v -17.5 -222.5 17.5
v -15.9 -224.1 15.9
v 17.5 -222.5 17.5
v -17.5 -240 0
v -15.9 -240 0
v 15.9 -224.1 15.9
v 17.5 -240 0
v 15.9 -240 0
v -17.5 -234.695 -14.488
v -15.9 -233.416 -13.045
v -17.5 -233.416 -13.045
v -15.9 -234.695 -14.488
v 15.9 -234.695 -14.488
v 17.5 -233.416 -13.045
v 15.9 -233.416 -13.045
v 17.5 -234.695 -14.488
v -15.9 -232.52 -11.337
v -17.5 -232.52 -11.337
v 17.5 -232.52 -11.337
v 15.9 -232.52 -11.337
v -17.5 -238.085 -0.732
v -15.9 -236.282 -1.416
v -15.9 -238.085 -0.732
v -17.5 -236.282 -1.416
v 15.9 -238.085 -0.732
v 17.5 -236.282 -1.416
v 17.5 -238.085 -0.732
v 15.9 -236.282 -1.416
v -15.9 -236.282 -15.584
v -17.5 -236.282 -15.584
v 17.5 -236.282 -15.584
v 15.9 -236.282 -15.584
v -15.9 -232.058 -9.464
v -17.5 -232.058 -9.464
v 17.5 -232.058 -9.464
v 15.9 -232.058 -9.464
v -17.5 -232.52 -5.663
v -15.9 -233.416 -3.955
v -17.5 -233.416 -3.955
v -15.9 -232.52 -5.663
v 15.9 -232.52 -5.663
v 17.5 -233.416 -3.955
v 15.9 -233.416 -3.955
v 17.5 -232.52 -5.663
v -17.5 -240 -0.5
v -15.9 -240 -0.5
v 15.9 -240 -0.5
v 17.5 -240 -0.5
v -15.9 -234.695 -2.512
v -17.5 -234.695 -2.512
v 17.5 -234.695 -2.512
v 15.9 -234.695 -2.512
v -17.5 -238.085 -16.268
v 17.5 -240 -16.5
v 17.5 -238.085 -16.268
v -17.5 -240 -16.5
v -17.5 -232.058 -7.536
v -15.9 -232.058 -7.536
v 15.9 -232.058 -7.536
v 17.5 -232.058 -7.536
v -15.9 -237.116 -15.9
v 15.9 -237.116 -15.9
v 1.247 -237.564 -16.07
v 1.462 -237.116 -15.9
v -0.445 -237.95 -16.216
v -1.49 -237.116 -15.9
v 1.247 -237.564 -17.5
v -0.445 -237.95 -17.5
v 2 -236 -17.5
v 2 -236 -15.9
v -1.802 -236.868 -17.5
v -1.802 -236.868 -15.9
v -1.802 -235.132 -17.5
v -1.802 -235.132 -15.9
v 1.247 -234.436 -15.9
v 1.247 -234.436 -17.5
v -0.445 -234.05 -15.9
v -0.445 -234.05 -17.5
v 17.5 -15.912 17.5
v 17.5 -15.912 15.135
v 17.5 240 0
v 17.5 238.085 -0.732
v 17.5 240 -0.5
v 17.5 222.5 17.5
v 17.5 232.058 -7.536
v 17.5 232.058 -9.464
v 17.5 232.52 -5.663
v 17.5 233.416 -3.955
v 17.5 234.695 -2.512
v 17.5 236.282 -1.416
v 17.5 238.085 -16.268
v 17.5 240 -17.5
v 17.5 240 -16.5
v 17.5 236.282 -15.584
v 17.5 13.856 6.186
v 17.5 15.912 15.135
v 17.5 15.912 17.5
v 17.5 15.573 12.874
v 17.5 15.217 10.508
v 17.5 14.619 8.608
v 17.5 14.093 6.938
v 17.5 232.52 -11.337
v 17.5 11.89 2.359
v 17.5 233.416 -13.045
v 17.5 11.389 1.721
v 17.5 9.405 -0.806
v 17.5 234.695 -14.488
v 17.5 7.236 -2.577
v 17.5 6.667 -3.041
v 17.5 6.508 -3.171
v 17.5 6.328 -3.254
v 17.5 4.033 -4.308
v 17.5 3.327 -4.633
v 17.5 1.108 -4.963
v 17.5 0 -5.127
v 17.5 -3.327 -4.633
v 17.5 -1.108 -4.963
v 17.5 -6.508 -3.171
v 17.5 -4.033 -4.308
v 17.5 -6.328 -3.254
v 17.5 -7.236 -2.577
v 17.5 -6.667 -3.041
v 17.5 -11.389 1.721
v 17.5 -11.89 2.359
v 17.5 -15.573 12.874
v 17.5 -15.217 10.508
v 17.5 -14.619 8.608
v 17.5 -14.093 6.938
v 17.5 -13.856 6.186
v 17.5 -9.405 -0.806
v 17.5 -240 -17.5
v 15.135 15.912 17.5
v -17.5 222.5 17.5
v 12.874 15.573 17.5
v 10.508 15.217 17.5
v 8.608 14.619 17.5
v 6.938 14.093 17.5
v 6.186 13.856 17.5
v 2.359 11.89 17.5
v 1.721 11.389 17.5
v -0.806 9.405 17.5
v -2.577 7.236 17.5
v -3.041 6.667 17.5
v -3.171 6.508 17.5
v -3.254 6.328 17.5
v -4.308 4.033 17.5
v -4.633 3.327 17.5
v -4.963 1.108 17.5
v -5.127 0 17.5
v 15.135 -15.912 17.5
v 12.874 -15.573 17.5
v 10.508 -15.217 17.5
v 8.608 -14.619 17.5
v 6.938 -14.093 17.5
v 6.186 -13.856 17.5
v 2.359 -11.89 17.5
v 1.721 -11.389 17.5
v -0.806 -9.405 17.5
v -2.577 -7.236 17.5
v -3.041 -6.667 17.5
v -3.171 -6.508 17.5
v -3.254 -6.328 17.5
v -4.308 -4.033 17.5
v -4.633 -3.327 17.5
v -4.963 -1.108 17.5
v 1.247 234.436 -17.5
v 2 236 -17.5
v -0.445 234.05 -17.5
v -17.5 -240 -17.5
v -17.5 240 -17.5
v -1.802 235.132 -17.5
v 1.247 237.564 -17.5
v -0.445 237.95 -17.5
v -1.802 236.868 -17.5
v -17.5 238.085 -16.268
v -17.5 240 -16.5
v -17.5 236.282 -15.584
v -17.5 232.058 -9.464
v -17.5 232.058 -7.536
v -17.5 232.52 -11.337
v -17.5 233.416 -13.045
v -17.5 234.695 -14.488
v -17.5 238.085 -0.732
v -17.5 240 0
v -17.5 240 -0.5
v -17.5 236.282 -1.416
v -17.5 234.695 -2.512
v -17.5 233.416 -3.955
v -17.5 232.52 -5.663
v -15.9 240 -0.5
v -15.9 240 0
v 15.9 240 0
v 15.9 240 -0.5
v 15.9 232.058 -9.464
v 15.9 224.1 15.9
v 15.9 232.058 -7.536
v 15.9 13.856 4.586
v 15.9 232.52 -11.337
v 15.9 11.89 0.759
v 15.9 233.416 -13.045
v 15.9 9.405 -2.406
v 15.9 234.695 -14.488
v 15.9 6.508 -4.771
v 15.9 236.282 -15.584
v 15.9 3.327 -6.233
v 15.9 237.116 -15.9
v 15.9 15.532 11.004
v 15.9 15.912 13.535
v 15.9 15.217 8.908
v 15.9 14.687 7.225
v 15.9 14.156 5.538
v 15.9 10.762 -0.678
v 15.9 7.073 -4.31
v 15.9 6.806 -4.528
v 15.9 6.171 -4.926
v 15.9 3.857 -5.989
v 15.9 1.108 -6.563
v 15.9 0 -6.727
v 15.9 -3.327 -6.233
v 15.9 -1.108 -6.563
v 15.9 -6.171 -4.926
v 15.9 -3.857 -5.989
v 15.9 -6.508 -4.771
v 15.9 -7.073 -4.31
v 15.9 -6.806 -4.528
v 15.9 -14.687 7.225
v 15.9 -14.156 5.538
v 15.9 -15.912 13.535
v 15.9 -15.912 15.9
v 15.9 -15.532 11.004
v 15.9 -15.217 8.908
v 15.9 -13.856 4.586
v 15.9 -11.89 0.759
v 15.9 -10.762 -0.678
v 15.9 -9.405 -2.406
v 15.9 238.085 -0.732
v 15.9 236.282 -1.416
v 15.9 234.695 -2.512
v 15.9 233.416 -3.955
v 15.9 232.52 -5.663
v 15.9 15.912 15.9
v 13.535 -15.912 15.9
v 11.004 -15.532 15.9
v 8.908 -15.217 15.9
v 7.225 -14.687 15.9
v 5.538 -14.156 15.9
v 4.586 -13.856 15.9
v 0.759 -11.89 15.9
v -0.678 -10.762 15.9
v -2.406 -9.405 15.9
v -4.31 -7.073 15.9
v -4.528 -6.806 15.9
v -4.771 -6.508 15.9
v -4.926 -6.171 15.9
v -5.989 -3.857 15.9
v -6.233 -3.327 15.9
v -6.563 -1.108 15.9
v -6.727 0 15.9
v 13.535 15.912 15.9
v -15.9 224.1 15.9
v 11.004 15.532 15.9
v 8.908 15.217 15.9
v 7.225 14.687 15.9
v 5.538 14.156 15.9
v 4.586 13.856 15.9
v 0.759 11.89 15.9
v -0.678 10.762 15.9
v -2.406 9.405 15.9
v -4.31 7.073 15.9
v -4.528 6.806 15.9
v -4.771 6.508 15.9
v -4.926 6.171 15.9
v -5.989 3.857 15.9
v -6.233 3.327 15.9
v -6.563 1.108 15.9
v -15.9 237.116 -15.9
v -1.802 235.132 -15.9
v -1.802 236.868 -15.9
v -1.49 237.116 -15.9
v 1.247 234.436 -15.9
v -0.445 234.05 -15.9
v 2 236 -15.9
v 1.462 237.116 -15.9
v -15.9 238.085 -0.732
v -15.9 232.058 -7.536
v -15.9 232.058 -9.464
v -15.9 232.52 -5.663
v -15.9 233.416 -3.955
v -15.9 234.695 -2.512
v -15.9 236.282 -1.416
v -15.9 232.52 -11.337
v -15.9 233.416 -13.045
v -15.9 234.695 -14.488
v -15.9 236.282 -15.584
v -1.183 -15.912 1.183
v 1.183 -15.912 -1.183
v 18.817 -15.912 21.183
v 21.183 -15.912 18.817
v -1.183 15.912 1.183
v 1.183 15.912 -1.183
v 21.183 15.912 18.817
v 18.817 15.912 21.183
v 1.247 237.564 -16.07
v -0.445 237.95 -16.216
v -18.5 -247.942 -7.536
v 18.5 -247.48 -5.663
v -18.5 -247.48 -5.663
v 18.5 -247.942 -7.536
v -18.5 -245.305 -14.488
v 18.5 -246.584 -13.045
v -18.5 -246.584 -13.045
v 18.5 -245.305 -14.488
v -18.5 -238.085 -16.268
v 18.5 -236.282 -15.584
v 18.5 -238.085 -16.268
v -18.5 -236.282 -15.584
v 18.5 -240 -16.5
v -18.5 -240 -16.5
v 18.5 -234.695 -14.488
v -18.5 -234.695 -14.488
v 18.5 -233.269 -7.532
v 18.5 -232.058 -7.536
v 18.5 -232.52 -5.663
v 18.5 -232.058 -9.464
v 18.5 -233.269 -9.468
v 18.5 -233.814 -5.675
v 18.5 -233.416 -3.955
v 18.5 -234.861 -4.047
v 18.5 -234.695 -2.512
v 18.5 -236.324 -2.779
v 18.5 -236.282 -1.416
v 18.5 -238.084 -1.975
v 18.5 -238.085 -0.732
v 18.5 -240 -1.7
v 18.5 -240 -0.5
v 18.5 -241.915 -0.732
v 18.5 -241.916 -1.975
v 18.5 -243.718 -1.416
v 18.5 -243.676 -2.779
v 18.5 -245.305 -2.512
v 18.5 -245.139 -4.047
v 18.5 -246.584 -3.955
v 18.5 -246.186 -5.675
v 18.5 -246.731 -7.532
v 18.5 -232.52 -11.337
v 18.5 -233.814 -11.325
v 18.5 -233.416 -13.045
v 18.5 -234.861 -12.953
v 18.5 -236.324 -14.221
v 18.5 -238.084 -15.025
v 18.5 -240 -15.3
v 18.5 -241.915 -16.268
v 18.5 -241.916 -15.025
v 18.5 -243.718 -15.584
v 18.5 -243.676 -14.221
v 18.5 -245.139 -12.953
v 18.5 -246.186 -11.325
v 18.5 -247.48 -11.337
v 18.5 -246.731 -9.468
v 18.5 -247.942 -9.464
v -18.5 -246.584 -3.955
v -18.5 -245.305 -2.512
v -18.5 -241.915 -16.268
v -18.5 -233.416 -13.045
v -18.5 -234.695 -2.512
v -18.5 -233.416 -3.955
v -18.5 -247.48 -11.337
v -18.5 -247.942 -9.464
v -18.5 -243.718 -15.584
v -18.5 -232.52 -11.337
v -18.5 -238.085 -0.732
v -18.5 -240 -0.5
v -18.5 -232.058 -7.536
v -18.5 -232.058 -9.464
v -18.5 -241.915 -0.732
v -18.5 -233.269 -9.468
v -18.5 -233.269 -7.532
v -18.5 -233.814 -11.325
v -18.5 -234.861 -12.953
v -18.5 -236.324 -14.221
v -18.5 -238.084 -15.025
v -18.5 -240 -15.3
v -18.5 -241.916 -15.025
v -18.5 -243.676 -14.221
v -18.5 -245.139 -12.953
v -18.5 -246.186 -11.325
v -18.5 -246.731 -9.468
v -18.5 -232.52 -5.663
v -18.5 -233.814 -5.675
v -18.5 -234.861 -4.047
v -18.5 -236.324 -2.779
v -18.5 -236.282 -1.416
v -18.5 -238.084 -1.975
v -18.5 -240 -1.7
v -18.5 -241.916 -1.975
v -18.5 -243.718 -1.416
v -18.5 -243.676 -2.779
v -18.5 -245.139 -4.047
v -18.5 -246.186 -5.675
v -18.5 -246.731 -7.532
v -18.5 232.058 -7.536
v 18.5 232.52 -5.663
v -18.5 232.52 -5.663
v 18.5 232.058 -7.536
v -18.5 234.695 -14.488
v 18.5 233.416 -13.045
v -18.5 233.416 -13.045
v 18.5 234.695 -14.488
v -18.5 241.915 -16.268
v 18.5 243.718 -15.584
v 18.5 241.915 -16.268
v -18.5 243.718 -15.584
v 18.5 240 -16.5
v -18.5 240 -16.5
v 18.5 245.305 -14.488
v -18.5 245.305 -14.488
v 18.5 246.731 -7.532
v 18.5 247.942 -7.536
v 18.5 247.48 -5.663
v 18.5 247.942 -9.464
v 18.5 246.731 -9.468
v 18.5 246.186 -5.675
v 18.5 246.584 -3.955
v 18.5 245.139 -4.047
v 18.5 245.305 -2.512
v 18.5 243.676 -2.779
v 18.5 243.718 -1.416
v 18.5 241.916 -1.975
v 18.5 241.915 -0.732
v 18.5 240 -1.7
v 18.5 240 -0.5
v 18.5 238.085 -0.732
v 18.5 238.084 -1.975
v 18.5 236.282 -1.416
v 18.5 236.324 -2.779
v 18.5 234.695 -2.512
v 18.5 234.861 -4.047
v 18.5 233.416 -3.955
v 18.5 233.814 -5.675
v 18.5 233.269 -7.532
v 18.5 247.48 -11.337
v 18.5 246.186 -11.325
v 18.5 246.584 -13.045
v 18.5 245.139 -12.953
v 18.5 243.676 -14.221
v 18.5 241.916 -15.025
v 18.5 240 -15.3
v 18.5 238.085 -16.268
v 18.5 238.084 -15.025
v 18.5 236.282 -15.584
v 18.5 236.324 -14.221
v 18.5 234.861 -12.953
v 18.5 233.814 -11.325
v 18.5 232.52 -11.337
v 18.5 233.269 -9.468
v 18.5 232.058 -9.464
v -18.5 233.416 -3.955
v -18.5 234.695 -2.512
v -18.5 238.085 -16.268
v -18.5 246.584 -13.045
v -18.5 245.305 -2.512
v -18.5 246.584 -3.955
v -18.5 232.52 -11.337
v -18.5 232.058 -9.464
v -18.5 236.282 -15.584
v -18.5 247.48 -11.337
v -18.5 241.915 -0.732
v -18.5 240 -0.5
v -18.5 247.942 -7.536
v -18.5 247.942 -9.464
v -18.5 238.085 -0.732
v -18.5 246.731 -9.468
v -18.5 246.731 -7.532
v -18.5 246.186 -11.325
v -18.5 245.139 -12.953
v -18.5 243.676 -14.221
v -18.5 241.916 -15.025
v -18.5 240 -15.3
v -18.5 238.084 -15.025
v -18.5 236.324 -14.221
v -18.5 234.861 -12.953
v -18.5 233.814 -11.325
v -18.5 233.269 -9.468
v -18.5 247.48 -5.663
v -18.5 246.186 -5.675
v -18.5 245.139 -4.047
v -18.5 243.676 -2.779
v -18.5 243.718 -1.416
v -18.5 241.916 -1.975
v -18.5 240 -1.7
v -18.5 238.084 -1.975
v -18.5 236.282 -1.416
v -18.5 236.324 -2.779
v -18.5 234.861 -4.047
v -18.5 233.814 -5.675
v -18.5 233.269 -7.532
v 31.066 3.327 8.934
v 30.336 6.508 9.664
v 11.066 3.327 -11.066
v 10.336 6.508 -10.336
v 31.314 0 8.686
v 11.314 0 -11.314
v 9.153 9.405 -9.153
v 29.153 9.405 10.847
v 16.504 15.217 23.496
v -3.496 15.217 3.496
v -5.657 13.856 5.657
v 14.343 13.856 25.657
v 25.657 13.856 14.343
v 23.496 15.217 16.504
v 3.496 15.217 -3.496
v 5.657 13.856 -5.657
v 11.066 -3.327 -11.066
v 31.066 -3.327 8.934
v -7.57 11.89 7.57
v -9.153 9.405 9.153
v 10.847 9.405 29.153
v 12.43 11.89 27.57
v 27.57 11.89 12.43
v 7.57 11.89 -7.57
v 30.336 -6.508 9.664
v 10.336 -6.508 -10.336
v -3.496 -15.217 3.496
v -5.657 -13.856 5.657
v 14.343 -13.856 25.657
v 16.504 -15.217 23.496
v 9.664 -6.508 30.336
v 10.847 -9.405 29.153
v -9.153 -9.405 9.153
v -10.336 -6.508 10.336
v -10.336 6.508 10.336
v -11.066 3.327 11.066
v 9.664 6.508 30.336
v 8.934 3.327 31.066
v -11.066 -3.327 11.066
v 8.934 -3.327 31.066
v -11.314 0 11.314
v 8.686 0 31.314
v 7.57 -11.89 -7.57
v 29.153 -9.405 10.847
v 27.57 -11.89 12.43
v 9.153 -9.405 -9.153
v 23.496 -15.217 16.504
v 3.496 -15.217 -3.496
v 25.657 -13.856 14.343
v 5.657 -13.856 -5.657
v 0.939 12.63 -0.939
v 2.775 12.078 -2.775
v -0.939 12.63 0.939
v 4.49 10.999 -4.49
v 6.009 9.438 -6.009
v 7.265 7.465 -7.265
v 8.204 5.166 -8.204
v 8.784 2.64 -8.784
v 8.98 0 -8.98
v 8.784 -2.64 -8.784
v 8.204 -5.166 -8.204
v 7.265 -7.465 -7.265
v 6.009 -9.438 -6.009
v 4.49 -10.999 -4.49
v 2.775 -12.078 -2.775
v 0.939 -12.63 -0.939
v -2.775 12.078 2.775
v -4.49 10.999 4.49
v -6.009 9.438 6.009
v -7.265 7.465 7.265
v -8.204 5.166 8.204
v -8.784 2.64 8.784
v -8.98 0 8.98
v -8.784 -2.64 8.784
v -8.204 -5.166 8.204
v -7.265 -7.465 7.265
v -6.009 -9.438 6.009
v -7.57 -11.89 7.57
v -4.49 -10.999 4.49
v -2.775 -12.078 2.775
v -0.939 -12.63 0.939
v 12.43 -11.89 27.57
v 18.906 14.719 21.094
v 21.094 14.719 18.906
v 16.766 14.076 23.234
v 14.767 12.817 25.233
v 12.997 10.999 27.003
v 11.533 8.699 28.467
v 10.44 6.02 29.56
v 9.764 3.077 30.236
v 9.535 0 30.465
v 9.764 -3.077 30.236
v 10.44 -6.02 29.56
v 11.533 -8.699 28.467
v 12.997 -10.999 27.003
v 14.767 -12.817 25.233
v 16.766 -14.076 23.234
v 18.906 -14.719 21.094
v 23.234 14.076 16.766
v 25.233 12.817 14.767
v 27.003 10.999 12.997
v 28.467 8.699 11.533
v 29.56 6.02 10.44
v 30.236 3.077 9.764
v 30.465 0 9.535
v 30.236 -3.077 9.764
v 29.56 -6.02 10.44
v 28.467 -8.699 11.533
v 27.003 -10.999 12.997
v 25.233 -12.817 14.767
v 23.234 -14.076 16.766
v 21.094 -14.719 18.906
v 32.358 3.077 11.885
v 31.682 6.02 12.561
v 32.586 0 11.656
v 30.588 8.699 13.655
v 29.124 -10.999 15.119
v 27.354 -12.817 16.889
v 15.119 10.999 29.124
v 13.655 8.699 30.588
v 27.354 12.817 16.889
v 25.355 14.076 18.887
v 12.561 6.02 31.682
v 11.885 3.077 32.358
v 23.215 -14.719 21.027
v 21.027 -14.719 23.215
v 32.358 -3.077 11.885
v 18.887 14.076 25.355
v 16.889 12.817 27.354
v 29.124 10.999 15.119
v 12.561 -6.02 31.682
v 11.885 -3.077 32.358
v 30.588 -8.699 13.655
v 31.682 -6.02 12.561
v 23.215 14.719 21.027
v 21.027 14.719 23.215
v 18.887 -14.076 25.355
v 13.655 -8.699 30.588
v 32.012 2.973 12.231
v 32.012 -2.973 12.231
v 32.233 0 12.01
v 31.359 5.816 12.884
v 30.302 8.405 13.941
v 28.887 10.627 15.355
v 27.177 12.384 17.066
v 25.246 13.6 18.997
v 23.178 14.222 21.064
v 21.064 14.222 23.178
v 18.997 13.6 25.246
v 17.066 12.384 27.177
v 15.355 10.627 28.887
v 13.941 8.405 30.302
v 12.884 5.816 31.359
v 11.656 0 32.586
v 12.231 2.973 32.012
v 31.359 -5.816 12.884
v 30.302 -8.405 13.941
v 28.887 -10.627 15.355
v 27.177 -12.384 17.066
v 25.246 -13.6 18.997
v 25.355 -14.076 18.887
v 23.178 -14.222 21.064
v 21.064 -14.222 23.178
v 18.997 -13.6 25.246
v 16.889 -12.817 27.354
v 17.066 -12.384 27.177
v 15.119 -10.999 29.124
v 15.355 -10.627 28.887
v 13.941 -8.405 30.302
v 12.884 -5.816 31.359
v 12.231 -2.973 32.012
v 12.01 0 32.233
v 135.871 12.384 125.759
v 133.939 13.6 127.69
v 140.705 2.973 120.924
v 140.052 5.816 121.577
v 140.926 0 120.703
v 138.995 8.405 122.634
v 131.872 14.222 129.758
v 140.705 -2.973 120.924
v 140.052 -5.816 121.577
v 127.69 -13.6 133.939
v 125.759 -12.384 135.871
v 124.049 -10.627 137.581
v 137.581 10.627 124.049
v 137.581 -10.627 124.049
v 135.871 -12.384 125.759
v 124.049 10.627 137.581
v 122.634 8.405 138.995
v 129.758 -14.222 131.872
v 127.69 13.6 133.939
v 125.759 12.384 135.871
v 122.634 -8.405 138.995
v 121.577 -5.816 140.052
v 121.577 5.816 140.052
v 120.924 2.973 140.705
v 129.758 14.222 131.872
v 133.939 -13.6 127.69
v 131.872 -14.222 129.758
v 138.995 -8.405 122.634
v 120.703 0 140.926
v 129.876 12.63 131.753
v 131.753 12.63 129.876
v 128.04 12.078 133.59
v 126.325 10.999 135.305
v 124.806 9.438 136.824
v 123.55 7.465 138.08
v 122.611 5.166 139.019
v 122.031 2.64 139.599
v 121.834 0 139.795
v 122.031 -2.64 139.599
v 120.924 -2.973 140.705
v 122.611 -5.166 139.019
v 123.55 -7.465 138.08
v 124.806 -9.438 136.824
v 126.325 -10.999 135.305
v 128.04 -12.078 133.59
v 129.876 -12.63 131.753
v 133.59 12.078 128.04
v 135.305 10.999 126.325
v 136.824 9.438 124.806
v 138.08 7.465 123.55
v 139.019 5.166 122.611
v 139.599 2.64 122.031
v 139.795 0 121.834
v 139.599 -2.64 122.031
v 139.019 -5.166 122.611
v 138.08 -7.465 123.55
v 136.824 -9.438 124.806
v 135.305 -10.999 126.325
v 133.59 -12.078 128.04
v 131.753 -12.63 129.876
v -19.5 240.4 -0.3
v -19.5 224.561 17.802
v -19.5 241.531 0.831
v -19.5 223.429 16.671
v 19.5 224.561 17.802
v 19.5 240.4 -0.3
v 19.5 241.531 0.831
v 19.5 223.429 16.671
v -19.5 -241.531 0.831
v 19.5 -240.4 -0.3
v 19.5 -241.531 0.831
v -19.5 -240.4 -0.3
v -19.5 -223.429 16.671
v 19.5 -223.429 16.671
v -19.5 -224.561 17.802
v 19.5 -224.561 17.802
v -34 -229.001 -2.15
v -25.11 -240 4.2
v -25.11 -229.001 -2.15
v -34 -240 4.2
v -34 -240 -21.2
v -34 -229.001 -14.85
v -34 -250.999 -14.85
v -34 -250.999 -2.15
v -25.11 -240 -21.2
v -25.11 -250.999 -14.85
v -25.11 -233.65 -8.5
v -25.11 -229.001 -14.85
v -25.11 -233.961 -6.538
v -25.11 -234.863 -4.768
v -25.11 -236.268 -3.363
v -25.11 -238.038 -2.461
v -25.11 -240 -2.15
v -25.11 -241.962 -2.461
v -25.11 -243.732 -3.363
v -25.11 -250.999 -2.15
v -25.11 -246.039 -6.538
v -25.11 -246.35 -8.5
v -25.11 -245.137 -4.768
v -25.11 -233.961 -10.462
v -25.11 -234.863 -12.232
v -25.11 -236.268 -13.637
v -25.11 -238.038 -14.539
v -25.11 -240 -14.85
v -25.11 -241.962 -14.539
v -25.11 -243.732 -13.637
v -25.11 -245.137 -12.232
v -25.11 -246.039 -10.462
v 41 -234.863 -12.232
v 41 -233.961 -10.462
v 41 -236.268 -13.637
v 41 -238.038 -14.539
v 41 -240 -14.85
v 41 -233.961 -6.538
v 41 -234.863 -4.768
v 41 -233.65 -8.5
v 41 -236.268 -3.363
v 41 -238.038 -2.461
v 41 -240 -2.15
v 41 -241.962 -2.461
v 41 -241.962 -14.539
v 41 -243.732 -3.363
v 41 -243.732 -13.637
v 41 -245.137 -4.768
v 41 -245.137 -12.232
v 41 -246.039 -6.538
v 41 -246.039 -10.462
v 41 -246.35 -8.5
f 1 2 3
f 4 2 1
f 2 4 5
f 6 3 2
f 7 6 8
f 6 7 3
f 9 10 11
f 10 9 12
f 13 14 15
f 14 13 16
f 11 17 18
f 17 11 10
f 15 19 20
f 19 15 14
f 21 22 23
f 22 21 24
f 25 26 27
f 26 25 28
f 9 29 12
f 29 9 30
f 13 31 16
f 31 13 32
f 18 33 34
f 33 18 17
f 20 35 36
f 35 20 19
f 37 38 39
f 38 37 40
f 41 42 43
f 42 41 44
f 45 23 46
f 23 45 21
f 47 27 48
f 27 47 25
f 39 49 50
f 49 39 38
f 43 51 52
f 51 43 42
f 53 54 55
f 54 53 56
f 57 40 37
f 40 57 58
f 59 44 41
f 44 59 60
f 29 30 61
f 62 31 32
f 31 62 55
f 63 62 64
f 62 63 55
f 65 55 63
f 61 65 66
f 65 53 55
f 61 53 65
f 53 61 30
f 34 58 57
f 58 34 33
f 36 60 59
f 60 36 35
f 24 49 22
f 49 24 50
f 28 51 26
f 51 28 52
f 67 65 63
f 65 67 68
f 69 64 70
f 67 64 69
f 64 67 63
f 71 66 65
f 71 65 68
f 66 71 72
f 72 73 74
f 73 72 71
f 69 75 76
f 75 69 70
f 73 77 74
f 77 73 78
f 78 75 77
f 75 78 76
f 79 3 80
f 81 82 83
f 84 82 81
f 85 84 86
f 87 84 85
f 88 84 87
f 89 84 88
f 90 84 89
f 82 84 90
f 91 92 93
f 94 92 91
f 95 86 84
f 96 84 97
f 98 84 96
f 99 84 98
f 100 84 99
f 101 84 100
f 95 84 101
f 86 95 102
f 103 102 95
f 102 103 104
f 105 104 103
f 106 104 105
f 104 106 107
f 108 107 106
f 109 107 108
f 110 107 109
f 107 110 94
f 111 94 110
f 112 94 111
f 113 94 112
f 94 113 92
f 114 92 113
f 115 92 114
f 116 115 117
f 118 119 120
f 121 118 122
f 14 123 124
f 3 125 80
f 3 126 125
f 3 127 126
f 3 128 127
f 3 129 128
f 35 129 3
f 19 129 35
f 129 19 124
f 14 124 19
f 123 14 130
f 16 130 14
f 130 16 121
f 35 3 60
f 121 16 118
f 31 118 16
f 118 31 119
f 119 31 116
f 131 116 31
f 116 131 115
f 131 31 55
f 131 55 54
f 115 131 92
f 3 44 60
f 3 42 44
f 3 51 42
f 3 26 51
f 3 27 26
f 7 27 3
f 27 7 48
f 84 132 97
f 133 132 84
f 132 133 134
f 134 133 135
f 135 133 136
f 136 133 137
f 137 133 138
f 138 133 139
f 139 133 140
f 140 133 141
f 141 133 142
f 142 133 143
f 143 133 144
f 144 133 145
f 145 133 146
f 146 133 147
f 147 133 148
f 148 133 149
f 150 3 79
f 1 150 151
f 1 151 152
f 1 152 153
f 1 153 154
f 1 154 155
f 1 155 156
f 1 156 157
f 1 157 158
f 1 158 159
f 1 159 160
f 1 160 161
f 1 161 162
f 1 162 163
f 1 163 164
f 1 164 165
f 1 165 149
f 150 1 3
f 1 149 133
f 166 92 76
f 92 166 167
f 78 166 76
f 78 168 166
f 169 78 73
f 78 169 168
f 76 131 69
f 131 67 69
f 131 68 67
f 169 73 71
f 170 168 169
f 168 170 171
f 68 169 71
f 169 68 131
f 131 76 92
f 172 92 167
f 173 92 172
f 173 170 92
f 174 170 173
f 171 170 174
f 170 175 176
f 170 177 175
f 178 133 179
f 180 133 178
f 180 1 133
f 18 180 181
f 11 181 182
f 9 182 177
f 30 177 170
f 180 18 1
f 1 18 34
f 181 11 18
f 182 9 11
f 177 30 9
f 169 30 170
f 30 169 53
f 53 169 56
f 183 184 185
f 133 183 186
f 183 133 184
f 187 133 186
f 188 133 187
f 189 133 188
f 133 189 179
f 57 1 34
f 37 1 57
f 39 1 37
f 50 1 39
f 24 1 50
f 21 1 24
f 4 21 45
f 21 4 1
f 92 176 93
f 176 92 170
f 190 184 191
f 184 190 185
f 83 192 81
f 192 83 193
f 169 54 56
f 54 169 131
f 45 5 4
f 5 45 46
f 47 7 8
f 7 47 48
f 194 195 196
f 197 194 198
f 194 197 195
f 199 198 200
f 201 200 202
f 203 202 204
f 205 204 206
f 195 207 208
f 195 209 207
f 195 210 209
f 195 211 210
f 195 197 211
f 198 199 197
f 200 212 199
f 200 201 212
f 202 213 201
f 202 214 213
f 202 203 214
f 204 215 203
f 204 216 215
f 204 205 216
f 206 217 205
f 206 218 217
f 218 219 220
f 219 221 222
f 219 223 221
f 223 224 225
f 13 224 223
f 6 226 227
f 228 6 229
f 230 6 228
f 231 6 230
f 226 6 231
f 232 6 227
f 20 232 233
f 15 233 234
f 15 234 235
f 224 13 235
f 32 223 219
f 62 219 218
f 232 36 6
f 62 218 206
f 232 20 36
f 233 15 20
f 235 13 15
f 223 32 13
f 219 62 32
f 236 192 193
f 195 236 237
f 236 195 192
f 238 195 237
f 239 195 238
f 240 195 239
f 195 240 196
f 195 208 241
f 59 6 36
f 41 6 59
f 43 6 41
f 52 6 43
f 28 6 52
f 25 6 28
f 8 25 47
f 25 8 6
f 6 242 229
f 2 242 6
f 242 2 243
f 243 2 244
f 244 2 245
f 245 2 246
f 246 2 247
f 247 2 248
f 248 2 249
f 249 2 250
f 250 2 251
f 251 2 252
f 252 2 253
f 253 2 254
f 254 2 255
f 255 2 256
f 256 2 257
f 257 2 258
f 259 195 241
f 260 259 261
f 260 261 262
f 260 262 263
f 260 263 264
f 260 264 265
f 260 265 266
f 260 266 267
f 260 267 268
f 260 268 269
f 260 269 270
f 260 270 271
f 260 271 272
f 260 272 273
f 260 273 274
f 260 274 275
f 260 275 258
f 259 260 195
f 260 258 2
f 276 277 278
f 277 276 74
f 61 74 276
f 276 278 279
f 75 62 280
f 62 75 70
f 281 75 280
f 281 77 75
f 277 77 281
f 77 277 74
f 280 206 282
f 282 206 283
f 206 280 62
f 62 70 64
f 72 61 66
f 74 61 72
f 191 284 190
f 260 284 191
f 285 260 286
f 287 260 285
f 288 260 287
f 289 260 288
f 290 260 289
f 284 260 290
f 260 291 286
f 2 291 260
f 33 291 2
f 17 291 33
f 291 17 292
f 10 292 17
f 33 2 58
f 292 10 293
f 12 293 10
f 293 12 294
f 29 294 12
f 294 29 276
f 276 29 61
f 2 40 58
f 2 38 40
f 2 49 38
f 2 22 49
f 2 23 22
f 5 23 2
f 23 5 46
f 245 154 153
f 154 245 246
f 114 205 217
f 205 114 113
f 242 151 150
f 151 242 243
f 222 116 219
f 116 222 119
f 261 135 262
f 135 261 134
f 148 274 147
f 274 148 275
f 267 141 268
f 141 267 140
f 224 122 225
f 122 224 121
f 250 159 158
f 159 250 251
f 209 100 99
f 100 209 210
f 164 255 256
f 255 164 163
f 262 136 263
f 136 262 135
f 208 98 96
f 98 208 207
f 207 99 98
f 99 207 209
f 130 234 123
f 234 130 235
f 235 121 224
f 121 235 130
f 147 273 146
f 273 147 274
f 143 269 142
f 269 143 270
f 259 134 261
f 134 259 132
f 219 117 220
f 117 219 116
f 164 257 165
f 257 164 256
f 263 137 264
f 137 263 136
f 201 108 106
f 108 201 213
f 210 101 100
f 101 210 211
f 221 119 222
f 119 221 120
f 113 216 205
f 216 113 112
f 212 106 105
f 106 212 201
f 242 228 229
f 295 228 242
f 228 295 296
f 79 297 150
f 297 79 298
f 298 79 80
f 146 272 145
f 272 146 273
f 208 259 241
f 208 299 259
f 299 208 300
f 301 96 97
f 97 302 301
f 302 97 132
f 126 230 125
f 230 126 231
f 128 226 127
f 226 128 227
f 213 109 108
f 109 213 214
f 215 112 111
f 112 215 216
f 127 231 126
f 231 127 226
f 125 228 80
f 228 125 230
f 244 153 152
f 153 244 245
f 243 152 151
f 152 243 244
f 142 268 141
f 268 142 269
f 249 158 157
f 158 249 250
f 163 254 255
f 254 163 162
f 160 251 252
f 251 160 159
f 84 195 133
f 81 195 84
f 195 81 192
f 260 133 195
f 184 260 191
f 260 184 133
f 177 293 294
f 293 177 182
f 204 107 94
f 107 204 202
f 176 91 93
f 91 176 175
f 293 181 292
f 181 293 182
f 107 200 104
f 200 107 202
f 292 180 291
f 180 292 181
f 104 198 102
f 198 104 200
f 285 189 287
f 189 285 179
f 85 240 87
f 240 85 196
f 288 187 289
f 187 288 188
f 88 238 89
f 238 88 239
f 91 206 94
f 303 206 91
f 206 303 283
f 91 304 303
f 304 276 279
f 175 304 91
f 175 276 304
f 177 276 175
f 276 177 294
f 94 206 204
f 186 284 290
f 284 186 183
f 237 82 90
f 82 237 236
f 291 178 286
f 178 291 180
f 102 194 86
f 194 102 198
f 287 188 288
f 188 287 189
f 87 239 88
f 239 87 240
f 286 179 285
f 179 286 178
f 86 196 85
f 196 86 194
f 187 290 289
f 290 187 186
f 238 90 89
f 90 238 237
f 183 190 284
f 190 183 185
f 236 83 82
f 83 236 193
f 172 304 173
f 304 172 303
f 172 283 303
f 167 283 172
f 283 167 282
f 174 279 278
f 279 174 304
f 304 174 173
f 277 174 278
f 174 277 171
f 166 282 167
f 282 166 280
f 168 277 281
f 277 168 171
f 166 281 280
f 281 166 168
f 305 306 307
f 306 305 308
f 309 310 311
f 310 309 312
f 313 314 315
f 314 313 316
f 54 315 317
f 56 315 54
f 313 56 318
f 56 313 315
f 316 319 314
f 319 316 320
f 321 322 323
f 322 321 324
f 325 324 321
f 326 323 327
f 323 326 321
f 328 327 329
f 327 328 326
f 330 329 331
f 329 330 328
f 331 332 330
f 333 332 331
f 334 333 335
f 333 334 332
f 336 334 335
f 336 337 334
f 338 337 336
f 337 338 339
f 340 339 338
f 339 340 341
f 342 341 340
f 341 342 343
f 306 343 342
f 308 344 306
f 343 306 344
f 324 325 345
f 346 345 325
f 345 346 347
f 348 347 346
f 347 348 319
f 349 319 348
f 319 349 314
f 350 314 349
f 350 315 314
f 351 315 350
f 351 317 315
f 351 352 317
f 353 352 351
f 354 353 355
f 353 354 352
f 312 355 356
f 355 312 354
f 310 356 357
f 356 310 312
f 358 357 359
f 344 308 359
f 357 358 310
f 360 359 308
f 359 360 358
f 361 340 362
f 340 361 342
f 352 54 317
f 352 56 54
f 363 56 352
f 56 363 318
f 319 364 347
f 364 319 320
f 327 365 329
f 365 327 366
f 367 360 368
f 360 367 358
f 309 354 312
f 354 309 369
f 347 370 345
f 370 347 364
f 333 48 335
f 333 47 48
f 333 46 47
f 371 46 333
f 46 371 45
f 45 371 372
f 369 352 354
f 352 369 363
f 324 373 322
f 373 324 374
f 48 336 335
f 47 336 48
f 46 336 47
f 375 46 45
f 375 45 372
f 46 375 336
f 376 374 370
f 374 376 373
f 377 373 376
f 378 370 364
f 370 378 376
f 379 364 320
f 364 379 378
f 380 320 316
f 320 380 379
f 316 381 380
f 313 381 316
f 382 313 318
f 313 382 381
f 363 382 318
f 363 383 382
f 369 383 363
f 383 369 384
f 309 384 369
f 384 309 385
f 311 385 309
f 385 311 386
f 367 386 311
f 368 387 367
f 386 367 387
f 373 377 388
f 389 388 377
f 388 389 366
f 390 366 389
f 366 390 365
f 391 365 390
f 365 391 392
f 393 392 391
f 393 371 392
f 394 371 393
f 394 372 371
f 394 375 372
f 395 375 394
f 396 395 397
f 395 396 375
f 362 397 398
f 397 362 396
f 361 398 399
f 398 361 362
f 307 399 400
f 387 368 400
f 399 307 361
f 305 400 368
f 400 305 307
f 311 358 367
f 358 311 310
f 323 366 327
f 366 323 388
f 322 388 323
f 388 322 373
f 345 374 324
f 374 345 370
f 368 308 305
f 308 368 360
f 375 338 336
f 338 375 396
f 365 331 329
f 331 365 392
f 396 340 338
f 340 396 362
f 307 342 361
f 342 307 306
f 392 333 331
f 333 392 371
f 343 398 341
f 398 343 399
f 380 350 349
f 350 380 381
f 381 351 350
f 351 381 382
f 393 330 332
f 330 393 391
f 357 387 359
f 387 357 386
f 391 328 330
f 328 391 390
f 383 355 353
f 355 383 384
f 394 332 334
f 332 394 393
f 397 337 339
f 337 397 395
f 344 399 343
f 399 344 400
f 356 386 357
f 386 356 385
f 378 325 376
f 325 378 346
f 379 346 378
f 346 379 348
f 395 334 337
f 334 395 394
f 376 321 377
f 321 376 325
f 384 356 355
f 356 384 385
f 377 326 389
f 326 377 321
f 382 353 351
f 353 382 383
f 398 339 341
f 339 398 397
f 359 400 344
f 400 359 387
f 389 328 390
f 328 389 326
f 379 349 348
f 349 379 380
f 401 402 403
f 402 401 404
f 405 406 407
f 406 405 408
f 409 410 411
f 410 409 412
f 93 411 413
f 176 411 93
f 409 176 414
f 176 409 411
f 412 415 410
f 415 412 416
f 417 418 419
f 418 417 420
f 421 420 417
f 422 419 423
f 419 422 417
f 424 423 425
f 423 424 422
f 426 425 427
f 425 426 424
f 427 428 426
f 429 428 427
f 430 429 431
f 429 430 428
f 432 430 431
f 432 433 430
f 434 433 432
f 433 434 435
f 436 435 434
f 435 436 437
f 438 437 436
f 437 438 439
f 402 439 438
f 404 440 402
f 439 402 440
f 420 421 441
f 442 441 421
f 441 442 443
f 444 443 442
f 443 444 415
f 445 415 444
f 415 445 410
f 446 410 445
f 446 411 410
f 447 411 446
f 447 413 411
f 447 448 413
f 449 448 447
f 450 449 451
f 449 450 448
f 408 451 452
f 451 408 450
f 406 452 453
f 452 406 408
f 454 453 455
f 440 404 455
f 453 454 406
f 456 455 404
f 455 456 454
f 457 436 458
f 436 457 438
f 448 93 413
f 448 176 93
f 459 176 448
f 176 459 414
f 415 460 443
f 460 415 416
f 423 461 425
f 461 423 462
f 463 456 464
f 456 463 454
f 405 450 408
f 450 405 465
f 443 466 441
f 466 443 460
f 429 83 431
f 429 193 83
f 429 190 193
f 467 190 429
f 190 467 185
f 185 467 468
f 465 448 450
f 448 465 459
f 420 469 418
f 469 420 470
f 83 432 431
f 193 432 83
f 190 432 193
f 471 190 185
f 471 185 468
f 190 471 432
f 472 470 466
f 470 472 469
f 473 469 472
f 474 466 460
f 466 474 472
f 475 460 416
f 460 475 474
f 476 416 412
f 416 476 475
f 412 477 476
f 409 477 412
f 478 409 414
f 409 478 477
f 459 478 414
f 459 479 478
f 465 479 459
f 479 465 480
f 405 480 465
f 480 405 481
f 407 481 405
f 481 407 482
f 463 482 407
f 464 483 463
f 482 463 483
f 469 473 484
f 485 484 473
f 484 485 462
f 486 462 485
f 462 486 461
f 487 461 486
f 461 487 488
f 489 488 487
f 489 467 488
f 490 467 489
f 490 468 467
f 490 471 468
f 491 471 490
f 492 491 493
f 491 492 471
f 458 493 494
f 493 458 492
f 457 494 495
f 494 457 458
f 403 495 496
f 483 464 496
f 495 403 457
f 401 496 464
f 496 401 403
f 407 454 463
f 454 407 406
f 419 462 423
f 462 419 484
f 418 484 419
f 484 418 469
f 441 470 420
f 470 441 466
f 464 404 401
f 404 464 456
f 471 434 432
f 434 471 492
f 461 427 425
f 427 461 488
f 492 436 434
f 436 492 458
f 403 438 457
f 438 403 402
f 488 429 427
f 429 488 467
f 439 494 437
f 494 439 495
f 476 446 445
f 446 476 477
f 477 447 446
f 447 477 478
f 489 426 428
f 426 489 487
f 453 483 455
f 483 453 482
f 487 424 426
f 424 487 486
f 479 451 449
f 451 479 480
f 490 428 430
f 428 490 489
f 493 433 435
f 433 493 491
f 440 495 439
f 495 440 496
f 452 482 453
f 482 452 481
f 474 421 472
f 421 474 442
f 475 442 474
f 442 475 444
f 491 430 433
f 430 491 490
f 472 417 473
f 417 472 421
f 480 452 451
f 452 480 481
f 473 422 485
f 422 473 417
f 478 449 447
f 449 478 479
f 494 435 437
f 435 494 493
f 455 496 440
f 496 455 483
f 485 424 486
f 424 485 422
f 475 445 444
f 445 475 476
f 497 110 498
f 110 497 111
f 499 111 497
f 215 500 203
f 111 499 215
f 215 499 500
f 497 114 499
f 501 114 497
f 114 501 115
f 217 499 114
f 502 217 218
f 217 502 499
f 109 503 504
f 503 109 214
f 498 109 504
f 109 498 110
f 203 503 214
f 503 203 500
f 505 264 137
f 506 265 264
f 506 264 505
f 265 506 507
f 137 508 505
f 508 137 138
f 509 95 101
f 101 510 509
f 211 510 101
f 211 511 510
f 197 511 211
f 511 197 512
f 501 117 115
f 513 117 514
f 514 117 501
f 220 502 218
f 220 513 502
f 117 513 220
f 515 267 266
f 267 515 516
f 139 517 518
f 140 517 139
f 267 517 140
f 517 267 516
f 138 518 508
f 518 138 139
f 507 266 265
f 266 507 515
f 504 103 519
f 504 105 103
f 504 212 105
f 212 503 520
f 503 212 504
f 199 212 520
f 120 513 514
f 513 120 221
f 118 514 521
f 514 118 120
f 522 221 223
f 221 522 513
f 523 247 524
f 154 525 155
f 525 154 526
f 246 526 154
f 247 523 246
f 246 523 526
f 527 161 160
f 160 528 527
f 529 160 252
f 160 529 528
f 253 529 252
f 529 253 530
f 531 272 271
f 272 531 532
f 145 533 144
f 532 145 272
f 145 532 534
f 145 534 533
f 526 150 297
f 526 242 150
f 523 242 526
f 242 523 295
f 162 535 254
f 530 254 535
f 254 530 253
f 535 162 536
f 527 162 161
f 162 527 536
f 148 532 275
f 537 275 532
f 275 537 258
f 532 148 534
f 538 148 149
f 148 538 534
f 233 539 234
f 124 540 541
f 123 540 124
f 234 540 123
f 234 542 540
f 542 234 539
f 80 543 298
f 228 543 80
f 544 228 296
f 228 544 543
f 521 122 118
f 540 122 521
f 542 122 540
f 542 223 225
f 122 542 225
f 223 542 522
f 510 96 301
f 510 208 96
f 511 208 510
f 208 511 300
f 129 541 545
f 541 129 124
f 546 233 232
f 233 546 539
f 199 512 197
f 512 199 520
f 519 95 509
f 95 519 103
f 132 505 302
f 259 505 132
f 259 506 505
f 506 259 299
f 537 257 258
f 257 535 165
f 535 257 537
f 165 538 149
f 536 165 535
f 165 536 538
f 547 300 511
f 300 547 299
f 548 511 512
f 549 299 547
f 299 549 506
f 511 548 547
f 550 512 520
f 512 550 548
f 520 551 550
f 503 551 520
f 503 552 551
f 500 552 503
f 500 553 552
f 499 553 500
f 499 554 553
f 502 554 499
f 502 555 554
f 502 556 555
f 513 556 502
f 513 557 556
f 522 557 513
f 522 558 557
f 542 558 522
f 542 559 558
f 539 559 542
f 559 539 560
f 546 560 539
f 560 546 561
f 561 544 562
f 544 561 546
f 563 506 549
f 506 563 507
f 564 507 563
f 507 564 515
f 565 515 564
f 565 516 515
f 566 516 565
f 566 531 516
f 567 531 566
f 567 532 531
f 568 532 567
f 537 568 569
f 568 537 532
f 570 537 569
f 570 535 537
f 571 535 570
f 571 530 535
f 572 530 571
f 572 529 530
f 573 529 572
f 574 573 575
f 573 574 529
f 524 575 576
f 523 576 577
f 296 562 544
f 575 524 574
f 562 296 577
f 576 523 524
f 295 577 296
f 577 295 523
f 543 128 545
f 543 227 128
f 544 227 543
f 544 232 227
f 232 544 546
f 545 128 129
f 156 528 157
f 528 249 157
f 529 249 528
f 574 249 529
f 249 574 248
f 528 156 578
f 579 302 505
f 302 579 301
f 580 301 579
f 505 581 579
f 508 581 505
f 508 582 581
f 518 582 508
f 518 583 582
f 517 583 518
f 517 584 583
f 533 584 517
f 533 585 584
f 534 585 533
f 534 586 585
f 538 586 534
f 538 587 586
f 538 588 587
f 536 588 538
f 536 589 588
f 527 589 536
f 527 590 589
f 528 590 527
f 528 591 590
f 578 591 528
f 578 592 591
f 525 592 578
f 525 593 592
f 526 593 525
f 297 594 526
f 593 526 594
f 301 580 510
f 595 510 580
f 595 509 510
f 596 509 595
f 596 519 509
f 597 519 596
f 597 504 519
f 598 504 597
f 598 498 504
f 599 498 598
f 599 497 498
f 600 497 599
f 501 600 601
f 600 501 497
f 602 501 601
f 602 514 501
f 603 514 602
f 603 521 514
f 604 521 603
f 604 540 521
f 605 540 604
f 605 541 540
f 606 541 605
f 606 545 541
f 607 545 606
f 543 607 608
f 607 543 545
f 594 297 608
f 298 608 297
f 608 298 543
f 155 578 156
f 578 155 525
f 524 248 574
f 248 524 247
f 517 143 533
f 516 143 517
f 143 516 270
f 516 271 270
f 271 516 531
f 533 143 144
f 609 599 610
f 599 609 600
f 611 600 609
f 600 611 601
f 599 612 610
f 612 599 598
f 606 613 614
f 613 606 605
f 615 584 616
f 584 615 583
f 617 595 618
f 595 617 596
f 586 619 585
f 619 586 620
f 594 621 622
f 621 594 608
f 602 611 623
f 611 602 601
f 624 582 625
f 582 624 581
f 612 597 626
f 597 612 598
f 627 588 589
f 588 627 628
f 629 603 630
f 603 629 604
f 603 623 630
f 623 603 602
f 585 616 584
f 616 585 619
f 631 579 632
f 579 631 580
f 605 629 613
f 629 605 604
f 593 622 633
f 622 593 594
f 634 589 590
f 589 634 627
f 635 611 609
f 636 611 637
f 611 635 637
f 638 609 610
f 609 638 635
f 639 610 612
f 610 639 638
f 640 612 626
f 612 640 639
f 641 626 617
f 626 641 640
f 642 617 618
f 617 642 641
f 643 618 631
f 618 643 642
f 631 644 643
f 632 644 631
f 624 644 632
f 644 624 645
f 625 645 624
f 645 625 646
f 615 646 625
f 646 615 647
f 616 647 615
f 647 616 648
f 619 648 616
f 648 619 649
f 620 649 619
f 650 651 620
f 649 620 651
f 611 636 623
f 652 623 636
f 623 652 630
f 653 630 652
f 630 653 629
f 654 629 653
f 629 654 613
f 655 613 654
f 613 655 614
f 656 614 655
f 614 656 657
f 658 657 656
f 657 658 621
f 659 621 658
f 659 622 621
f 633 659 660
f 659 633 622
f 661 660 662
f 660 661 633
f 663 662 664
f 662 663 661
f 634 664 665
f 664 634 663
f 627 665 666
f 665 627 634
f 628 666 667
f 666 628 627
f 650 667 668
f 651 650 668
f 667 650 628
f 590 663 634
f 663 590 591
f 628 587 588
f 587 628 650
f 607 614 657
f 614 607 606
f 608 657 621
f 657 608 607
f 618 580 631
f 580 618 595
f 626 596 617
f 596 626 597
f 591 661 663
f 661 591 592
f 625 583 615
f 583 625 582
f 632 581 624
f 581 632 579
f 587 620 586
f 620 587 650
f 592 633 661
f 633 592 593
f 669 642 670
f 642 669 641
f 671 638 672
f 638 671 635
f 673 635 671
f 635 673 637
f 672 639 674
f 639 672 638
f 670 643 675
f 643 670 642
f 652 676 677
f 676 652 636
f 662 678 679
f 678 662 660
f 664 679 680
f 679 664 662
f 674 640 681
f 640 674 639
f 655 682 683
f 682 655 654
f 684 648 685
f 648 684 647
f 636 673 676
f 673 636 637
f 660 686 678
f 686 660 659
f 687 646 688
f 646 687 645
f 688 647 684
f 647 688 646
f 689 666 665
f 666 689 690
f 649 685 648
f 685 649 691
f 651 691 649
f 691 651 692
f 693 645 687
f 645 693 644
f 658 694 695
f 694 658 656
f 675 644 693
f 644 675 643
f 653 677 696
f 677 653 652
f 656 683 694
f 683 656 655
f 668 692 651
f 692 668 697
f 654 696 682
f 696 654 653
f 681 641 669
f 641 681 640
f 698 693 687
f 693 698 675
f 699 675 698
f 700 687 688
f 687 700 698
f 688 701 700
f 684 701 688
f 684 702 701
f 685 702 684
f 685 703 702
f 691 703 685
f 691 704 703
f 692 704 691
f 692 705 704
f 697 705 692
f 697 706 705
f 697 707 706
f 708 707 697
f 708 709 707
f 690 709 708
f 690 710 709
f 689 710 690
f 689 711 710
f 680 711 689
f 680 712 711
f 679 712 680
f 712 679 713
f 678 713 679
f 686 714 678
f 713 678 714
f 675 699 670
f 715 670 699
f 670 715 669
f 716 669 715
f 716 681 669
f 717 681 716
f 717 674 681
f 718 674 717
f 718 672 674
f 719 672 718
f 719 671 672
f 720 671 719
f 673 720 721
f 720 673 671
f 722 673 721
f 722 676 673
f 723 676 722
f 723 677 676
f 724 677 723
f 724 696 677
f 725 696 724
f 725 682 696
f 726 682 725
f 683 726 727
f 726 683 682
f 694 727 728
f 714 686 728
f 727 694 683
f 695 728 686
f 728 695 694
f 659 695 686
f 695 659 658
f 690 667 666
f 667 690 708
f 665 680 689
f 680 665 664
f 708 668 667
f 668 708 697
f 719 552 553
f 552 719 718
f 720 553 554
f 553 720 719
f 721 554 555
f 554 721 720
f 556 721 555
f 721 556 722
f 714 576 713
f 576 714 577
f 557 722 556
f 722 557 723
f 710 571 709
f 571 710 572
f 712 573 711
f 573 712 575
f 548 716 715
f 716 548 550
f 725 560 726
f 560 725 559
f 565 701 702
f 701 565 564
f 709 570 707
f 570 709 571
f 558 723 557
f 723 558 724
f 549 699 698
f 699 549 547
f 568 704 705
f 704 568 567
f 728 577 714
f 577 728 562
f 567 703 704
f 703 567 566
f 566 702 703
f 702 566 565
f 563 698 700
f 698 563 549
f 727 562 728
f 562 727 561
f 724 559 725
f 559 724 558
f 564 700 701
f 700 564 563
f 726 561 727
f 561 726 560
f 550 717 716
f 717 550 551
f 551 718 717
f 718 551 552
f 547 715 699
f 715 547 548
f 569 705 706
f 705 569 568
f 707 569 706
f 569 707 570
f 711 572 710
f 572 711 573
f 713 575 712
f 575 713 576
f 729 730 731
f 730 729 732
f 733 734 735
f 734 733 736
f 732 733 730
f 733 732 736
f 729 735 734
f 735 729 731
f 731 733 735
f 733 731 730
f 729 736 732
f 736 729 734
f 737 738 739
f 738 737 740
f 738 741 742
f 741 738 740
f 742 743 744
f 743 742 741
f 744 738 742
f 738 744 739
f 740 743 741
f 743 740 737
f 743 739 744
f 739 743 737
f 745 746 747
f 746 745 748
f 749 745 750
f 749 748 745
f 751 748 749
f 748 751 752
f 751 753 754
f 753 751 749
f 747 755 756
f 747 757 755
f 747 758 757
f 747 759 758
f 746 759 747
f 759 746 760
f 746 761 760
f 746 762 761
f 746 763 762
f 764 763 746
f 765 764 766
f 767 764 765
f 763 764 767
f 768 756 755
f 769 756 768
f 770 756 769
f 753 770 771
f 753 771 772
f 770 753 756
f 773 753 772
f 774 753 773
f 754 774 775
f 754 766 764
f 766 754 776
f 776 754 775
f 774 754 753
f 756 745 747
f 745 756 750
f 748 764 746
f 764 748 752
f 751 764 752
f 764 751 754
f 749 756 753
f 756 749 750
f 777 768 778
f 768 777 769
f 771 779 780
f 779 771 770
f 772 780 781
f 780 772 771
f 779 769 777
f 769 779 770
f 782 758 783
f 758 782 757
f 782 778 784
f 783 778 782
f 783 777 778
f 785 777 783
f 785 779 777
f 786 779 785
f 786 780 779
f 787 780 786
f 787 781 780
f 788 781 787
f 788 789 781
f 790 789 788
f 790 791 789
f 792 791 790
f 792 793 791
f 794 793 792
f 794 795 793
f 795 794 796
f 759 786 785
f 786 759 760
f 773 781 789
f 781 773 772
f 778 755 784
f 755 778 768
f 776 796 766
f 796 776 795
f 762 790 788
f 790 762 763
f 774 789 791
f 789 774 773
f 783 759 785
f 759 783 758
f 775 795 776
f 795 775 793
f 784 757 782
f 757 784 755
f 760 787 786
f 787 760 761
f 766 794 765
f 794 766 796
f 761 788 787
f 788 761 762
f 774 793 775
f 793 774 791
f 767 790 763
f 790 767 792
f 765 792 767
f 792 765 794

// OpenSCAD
// file: hexagonalprism.scad
hex_prism(6.2,6);



module hex_prism(r,h){
    linear_extrude(height=h){
        hex(r);
    }
}

module hex(r){
    polygon(points = [[r,0],[r/2,r*sqrt(3)/2],
                [-r/2,r*sqrt(3)/2],[-r,0],
                [-r/2,-r*sqrt(3)/2],[r/2,-r*sqrt(3)/2]]);
}
// file: bolts.scad
use <hexagonalprism.scad>

bolt();

translate([30,0,0]) nut();

module kingpin(){
    bolt(d=12.7,l=75);
}

module bolt(d=12.7,l=62){
    rad = d/2;
    len = l;
    color("gray") hex_prism(2*rad,rad*1.4);
    color("silver") cylinder(r=rad,h=len);
}

module nut(d=12.7){
    rad = d/2;
    color("gray") difference(){
        hex_prism(2*rad,rad*1.4);
        color("silver") cylinder(r=rad,rad*1.4+2);
    }
}
// main file
use <./bolts.scad>

crossMember();
translate([-34,-240,-8.5]) rotate([0,90,0]) kingpin();

module crossMember() color("lightblue"){
    xMemShell();
    translate([0,-240,-8.5]) kingBush();
    translate([0,240,-8.5]) kingBush();
    translate([-19.5,240.4,-0.3]) endcover();
    translate([-19.5,-240.4,-0.3]) mirror([0,1,0]) endcover();
    steerer();
}

module steerer() rotate([0,45,0]) difference(){
    union(){
        cylinder(r=16,h=20*sqrt(2));
        cylinder(r=14.8,h=20*sqrt(2)+3);
        cylinder(r=14.3,h=185);
    }
    translate([0,0,-1]) cylinder(r=12.7,h=187);
}

module endcover() rotate([45,0,0,]) cube([39,1.6,24]);

module kingBush(){
    translate([-18.5,0,0]) rotate([0,90,0]) difference(){
        cylinder(r=8,h=37);
        translate([0,0,-1]) cylinder(r=6.8,h=39);
    }
}

module xMemShell() difference(){
    cube([35,480,35],center=true);
    cube([31.8,482,31.8],center=true);
    rotate([0,45,0]) cylinder(r=16,h=42);
    translate([-21,240,0]) rotate([45,0,0]) cube(42);
    translate([-21,240,-8.5]) rotate([0,90,0]) cylinder(r=8,h=42);
    translate([0,236,-18.5]) cylinder(r=2,h=4);
    mirror([0,1,0]){
        translate([-21,240,0]) rotate([45,0,0]) cube(42);
        translate([-21,240,-8.5]) rotate([0,90,0]) cylinder(r=8,h=42);
        translate([0,236,-18.5]) cylinder(r=2,h=4);
    }
}
